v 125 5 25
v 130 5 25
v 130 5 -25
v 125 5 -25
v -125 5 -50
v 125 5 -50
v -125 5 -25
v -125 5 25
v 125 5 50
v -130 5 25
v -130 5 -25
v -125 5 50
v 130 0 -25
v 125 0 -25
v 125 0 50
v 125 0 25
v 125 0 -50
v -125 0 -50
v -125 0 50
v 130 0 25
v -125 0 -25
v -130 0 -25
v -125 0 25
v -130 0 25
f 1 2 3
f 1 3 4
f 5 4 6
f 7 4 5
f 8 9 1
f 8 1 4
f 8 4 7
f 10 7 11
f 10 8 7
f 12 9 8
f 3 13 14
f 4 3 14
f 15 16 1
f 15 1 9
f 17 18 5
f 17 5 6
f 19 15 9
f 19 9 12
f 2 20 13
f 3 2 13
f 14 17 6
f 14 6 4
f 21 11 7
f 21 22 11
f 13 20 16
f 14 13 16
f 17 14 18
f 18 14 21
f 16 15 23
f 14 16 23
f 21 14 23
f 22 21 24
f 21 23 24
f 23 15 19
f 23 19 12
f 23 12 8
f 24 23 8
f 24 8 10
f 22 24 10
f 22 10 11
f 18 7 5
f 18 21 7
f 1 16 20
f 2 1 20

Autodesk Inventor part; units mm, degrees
ref_plane "YZ Plane" through (0, 0, 0) normal (1, 0, 0) x (0, 1, 0)
ref_plane "XZ Plane" through (0, 0, 0) normal (0, 1, 0) x (-1, 0, 0)
ref_plane "XY Plane" through (0, 0, 0) normal (0, 0, 1) x (1, 0, 0)
sketch "Sketch1" plane through (0, 0, 0) normal (0, 1, 0) x (-1, 0, 0)
  line L0 (-125, 50) -> (125, 50)
  line L1 (125, 50) -> (125, -50)
  line L2 (125, -50) -> (-125, -50)
  line L3 (-125, -50) -> (-125, 50)
  line L4 (-125, 50) -> (125, -50) construction
  line L5 (125, 50) -> (-125, -50) construction
  line L6 (0, 50) -> (0, -50) construction
  line L7 (125, 25) -> (130, 25)
  line L8 (130, 25) -> (130, -25)
  line L9 (130, -25) -> (125, -25)
  line L10 (125, -25) -> (125, 25)
  line L11 (-125, 25) -> (-130, 25)
  line L12 (-130, 25) -> (-130, -25)
  line L13 (-130, -25) -> (-125, -25)
  point P0 (0, 0)
  dimension "d0" = 100
  dimension "d1" = 250
  dimension "d2" = 50
  dimension "d3" = 5
  dimension "d4" = 25
extrude "Extrusion1" add sketch "Sketch1" along normal blind 5
equation "\"BendRadius\" = Thickness"
equation "\"BendReliefWidth\" = Thickness"
equation "\"BendReliefDepth\" = 0.5 * Thickness"
equation "\"CornerReliefSize\" = 4 * Thickness"
equation "\"MinimumRemnant\" = 2 * Thickness"
equation "\"TransitionRadius\" = BendRadius"
equation "\"JacobiRadiusSize\" = BendRadius"
equation "\"GapSize\" = Thickness"
equation "\"Thickness\" = 3.048"
properties part number "Tapa2" material "Wood (Cherry)"
